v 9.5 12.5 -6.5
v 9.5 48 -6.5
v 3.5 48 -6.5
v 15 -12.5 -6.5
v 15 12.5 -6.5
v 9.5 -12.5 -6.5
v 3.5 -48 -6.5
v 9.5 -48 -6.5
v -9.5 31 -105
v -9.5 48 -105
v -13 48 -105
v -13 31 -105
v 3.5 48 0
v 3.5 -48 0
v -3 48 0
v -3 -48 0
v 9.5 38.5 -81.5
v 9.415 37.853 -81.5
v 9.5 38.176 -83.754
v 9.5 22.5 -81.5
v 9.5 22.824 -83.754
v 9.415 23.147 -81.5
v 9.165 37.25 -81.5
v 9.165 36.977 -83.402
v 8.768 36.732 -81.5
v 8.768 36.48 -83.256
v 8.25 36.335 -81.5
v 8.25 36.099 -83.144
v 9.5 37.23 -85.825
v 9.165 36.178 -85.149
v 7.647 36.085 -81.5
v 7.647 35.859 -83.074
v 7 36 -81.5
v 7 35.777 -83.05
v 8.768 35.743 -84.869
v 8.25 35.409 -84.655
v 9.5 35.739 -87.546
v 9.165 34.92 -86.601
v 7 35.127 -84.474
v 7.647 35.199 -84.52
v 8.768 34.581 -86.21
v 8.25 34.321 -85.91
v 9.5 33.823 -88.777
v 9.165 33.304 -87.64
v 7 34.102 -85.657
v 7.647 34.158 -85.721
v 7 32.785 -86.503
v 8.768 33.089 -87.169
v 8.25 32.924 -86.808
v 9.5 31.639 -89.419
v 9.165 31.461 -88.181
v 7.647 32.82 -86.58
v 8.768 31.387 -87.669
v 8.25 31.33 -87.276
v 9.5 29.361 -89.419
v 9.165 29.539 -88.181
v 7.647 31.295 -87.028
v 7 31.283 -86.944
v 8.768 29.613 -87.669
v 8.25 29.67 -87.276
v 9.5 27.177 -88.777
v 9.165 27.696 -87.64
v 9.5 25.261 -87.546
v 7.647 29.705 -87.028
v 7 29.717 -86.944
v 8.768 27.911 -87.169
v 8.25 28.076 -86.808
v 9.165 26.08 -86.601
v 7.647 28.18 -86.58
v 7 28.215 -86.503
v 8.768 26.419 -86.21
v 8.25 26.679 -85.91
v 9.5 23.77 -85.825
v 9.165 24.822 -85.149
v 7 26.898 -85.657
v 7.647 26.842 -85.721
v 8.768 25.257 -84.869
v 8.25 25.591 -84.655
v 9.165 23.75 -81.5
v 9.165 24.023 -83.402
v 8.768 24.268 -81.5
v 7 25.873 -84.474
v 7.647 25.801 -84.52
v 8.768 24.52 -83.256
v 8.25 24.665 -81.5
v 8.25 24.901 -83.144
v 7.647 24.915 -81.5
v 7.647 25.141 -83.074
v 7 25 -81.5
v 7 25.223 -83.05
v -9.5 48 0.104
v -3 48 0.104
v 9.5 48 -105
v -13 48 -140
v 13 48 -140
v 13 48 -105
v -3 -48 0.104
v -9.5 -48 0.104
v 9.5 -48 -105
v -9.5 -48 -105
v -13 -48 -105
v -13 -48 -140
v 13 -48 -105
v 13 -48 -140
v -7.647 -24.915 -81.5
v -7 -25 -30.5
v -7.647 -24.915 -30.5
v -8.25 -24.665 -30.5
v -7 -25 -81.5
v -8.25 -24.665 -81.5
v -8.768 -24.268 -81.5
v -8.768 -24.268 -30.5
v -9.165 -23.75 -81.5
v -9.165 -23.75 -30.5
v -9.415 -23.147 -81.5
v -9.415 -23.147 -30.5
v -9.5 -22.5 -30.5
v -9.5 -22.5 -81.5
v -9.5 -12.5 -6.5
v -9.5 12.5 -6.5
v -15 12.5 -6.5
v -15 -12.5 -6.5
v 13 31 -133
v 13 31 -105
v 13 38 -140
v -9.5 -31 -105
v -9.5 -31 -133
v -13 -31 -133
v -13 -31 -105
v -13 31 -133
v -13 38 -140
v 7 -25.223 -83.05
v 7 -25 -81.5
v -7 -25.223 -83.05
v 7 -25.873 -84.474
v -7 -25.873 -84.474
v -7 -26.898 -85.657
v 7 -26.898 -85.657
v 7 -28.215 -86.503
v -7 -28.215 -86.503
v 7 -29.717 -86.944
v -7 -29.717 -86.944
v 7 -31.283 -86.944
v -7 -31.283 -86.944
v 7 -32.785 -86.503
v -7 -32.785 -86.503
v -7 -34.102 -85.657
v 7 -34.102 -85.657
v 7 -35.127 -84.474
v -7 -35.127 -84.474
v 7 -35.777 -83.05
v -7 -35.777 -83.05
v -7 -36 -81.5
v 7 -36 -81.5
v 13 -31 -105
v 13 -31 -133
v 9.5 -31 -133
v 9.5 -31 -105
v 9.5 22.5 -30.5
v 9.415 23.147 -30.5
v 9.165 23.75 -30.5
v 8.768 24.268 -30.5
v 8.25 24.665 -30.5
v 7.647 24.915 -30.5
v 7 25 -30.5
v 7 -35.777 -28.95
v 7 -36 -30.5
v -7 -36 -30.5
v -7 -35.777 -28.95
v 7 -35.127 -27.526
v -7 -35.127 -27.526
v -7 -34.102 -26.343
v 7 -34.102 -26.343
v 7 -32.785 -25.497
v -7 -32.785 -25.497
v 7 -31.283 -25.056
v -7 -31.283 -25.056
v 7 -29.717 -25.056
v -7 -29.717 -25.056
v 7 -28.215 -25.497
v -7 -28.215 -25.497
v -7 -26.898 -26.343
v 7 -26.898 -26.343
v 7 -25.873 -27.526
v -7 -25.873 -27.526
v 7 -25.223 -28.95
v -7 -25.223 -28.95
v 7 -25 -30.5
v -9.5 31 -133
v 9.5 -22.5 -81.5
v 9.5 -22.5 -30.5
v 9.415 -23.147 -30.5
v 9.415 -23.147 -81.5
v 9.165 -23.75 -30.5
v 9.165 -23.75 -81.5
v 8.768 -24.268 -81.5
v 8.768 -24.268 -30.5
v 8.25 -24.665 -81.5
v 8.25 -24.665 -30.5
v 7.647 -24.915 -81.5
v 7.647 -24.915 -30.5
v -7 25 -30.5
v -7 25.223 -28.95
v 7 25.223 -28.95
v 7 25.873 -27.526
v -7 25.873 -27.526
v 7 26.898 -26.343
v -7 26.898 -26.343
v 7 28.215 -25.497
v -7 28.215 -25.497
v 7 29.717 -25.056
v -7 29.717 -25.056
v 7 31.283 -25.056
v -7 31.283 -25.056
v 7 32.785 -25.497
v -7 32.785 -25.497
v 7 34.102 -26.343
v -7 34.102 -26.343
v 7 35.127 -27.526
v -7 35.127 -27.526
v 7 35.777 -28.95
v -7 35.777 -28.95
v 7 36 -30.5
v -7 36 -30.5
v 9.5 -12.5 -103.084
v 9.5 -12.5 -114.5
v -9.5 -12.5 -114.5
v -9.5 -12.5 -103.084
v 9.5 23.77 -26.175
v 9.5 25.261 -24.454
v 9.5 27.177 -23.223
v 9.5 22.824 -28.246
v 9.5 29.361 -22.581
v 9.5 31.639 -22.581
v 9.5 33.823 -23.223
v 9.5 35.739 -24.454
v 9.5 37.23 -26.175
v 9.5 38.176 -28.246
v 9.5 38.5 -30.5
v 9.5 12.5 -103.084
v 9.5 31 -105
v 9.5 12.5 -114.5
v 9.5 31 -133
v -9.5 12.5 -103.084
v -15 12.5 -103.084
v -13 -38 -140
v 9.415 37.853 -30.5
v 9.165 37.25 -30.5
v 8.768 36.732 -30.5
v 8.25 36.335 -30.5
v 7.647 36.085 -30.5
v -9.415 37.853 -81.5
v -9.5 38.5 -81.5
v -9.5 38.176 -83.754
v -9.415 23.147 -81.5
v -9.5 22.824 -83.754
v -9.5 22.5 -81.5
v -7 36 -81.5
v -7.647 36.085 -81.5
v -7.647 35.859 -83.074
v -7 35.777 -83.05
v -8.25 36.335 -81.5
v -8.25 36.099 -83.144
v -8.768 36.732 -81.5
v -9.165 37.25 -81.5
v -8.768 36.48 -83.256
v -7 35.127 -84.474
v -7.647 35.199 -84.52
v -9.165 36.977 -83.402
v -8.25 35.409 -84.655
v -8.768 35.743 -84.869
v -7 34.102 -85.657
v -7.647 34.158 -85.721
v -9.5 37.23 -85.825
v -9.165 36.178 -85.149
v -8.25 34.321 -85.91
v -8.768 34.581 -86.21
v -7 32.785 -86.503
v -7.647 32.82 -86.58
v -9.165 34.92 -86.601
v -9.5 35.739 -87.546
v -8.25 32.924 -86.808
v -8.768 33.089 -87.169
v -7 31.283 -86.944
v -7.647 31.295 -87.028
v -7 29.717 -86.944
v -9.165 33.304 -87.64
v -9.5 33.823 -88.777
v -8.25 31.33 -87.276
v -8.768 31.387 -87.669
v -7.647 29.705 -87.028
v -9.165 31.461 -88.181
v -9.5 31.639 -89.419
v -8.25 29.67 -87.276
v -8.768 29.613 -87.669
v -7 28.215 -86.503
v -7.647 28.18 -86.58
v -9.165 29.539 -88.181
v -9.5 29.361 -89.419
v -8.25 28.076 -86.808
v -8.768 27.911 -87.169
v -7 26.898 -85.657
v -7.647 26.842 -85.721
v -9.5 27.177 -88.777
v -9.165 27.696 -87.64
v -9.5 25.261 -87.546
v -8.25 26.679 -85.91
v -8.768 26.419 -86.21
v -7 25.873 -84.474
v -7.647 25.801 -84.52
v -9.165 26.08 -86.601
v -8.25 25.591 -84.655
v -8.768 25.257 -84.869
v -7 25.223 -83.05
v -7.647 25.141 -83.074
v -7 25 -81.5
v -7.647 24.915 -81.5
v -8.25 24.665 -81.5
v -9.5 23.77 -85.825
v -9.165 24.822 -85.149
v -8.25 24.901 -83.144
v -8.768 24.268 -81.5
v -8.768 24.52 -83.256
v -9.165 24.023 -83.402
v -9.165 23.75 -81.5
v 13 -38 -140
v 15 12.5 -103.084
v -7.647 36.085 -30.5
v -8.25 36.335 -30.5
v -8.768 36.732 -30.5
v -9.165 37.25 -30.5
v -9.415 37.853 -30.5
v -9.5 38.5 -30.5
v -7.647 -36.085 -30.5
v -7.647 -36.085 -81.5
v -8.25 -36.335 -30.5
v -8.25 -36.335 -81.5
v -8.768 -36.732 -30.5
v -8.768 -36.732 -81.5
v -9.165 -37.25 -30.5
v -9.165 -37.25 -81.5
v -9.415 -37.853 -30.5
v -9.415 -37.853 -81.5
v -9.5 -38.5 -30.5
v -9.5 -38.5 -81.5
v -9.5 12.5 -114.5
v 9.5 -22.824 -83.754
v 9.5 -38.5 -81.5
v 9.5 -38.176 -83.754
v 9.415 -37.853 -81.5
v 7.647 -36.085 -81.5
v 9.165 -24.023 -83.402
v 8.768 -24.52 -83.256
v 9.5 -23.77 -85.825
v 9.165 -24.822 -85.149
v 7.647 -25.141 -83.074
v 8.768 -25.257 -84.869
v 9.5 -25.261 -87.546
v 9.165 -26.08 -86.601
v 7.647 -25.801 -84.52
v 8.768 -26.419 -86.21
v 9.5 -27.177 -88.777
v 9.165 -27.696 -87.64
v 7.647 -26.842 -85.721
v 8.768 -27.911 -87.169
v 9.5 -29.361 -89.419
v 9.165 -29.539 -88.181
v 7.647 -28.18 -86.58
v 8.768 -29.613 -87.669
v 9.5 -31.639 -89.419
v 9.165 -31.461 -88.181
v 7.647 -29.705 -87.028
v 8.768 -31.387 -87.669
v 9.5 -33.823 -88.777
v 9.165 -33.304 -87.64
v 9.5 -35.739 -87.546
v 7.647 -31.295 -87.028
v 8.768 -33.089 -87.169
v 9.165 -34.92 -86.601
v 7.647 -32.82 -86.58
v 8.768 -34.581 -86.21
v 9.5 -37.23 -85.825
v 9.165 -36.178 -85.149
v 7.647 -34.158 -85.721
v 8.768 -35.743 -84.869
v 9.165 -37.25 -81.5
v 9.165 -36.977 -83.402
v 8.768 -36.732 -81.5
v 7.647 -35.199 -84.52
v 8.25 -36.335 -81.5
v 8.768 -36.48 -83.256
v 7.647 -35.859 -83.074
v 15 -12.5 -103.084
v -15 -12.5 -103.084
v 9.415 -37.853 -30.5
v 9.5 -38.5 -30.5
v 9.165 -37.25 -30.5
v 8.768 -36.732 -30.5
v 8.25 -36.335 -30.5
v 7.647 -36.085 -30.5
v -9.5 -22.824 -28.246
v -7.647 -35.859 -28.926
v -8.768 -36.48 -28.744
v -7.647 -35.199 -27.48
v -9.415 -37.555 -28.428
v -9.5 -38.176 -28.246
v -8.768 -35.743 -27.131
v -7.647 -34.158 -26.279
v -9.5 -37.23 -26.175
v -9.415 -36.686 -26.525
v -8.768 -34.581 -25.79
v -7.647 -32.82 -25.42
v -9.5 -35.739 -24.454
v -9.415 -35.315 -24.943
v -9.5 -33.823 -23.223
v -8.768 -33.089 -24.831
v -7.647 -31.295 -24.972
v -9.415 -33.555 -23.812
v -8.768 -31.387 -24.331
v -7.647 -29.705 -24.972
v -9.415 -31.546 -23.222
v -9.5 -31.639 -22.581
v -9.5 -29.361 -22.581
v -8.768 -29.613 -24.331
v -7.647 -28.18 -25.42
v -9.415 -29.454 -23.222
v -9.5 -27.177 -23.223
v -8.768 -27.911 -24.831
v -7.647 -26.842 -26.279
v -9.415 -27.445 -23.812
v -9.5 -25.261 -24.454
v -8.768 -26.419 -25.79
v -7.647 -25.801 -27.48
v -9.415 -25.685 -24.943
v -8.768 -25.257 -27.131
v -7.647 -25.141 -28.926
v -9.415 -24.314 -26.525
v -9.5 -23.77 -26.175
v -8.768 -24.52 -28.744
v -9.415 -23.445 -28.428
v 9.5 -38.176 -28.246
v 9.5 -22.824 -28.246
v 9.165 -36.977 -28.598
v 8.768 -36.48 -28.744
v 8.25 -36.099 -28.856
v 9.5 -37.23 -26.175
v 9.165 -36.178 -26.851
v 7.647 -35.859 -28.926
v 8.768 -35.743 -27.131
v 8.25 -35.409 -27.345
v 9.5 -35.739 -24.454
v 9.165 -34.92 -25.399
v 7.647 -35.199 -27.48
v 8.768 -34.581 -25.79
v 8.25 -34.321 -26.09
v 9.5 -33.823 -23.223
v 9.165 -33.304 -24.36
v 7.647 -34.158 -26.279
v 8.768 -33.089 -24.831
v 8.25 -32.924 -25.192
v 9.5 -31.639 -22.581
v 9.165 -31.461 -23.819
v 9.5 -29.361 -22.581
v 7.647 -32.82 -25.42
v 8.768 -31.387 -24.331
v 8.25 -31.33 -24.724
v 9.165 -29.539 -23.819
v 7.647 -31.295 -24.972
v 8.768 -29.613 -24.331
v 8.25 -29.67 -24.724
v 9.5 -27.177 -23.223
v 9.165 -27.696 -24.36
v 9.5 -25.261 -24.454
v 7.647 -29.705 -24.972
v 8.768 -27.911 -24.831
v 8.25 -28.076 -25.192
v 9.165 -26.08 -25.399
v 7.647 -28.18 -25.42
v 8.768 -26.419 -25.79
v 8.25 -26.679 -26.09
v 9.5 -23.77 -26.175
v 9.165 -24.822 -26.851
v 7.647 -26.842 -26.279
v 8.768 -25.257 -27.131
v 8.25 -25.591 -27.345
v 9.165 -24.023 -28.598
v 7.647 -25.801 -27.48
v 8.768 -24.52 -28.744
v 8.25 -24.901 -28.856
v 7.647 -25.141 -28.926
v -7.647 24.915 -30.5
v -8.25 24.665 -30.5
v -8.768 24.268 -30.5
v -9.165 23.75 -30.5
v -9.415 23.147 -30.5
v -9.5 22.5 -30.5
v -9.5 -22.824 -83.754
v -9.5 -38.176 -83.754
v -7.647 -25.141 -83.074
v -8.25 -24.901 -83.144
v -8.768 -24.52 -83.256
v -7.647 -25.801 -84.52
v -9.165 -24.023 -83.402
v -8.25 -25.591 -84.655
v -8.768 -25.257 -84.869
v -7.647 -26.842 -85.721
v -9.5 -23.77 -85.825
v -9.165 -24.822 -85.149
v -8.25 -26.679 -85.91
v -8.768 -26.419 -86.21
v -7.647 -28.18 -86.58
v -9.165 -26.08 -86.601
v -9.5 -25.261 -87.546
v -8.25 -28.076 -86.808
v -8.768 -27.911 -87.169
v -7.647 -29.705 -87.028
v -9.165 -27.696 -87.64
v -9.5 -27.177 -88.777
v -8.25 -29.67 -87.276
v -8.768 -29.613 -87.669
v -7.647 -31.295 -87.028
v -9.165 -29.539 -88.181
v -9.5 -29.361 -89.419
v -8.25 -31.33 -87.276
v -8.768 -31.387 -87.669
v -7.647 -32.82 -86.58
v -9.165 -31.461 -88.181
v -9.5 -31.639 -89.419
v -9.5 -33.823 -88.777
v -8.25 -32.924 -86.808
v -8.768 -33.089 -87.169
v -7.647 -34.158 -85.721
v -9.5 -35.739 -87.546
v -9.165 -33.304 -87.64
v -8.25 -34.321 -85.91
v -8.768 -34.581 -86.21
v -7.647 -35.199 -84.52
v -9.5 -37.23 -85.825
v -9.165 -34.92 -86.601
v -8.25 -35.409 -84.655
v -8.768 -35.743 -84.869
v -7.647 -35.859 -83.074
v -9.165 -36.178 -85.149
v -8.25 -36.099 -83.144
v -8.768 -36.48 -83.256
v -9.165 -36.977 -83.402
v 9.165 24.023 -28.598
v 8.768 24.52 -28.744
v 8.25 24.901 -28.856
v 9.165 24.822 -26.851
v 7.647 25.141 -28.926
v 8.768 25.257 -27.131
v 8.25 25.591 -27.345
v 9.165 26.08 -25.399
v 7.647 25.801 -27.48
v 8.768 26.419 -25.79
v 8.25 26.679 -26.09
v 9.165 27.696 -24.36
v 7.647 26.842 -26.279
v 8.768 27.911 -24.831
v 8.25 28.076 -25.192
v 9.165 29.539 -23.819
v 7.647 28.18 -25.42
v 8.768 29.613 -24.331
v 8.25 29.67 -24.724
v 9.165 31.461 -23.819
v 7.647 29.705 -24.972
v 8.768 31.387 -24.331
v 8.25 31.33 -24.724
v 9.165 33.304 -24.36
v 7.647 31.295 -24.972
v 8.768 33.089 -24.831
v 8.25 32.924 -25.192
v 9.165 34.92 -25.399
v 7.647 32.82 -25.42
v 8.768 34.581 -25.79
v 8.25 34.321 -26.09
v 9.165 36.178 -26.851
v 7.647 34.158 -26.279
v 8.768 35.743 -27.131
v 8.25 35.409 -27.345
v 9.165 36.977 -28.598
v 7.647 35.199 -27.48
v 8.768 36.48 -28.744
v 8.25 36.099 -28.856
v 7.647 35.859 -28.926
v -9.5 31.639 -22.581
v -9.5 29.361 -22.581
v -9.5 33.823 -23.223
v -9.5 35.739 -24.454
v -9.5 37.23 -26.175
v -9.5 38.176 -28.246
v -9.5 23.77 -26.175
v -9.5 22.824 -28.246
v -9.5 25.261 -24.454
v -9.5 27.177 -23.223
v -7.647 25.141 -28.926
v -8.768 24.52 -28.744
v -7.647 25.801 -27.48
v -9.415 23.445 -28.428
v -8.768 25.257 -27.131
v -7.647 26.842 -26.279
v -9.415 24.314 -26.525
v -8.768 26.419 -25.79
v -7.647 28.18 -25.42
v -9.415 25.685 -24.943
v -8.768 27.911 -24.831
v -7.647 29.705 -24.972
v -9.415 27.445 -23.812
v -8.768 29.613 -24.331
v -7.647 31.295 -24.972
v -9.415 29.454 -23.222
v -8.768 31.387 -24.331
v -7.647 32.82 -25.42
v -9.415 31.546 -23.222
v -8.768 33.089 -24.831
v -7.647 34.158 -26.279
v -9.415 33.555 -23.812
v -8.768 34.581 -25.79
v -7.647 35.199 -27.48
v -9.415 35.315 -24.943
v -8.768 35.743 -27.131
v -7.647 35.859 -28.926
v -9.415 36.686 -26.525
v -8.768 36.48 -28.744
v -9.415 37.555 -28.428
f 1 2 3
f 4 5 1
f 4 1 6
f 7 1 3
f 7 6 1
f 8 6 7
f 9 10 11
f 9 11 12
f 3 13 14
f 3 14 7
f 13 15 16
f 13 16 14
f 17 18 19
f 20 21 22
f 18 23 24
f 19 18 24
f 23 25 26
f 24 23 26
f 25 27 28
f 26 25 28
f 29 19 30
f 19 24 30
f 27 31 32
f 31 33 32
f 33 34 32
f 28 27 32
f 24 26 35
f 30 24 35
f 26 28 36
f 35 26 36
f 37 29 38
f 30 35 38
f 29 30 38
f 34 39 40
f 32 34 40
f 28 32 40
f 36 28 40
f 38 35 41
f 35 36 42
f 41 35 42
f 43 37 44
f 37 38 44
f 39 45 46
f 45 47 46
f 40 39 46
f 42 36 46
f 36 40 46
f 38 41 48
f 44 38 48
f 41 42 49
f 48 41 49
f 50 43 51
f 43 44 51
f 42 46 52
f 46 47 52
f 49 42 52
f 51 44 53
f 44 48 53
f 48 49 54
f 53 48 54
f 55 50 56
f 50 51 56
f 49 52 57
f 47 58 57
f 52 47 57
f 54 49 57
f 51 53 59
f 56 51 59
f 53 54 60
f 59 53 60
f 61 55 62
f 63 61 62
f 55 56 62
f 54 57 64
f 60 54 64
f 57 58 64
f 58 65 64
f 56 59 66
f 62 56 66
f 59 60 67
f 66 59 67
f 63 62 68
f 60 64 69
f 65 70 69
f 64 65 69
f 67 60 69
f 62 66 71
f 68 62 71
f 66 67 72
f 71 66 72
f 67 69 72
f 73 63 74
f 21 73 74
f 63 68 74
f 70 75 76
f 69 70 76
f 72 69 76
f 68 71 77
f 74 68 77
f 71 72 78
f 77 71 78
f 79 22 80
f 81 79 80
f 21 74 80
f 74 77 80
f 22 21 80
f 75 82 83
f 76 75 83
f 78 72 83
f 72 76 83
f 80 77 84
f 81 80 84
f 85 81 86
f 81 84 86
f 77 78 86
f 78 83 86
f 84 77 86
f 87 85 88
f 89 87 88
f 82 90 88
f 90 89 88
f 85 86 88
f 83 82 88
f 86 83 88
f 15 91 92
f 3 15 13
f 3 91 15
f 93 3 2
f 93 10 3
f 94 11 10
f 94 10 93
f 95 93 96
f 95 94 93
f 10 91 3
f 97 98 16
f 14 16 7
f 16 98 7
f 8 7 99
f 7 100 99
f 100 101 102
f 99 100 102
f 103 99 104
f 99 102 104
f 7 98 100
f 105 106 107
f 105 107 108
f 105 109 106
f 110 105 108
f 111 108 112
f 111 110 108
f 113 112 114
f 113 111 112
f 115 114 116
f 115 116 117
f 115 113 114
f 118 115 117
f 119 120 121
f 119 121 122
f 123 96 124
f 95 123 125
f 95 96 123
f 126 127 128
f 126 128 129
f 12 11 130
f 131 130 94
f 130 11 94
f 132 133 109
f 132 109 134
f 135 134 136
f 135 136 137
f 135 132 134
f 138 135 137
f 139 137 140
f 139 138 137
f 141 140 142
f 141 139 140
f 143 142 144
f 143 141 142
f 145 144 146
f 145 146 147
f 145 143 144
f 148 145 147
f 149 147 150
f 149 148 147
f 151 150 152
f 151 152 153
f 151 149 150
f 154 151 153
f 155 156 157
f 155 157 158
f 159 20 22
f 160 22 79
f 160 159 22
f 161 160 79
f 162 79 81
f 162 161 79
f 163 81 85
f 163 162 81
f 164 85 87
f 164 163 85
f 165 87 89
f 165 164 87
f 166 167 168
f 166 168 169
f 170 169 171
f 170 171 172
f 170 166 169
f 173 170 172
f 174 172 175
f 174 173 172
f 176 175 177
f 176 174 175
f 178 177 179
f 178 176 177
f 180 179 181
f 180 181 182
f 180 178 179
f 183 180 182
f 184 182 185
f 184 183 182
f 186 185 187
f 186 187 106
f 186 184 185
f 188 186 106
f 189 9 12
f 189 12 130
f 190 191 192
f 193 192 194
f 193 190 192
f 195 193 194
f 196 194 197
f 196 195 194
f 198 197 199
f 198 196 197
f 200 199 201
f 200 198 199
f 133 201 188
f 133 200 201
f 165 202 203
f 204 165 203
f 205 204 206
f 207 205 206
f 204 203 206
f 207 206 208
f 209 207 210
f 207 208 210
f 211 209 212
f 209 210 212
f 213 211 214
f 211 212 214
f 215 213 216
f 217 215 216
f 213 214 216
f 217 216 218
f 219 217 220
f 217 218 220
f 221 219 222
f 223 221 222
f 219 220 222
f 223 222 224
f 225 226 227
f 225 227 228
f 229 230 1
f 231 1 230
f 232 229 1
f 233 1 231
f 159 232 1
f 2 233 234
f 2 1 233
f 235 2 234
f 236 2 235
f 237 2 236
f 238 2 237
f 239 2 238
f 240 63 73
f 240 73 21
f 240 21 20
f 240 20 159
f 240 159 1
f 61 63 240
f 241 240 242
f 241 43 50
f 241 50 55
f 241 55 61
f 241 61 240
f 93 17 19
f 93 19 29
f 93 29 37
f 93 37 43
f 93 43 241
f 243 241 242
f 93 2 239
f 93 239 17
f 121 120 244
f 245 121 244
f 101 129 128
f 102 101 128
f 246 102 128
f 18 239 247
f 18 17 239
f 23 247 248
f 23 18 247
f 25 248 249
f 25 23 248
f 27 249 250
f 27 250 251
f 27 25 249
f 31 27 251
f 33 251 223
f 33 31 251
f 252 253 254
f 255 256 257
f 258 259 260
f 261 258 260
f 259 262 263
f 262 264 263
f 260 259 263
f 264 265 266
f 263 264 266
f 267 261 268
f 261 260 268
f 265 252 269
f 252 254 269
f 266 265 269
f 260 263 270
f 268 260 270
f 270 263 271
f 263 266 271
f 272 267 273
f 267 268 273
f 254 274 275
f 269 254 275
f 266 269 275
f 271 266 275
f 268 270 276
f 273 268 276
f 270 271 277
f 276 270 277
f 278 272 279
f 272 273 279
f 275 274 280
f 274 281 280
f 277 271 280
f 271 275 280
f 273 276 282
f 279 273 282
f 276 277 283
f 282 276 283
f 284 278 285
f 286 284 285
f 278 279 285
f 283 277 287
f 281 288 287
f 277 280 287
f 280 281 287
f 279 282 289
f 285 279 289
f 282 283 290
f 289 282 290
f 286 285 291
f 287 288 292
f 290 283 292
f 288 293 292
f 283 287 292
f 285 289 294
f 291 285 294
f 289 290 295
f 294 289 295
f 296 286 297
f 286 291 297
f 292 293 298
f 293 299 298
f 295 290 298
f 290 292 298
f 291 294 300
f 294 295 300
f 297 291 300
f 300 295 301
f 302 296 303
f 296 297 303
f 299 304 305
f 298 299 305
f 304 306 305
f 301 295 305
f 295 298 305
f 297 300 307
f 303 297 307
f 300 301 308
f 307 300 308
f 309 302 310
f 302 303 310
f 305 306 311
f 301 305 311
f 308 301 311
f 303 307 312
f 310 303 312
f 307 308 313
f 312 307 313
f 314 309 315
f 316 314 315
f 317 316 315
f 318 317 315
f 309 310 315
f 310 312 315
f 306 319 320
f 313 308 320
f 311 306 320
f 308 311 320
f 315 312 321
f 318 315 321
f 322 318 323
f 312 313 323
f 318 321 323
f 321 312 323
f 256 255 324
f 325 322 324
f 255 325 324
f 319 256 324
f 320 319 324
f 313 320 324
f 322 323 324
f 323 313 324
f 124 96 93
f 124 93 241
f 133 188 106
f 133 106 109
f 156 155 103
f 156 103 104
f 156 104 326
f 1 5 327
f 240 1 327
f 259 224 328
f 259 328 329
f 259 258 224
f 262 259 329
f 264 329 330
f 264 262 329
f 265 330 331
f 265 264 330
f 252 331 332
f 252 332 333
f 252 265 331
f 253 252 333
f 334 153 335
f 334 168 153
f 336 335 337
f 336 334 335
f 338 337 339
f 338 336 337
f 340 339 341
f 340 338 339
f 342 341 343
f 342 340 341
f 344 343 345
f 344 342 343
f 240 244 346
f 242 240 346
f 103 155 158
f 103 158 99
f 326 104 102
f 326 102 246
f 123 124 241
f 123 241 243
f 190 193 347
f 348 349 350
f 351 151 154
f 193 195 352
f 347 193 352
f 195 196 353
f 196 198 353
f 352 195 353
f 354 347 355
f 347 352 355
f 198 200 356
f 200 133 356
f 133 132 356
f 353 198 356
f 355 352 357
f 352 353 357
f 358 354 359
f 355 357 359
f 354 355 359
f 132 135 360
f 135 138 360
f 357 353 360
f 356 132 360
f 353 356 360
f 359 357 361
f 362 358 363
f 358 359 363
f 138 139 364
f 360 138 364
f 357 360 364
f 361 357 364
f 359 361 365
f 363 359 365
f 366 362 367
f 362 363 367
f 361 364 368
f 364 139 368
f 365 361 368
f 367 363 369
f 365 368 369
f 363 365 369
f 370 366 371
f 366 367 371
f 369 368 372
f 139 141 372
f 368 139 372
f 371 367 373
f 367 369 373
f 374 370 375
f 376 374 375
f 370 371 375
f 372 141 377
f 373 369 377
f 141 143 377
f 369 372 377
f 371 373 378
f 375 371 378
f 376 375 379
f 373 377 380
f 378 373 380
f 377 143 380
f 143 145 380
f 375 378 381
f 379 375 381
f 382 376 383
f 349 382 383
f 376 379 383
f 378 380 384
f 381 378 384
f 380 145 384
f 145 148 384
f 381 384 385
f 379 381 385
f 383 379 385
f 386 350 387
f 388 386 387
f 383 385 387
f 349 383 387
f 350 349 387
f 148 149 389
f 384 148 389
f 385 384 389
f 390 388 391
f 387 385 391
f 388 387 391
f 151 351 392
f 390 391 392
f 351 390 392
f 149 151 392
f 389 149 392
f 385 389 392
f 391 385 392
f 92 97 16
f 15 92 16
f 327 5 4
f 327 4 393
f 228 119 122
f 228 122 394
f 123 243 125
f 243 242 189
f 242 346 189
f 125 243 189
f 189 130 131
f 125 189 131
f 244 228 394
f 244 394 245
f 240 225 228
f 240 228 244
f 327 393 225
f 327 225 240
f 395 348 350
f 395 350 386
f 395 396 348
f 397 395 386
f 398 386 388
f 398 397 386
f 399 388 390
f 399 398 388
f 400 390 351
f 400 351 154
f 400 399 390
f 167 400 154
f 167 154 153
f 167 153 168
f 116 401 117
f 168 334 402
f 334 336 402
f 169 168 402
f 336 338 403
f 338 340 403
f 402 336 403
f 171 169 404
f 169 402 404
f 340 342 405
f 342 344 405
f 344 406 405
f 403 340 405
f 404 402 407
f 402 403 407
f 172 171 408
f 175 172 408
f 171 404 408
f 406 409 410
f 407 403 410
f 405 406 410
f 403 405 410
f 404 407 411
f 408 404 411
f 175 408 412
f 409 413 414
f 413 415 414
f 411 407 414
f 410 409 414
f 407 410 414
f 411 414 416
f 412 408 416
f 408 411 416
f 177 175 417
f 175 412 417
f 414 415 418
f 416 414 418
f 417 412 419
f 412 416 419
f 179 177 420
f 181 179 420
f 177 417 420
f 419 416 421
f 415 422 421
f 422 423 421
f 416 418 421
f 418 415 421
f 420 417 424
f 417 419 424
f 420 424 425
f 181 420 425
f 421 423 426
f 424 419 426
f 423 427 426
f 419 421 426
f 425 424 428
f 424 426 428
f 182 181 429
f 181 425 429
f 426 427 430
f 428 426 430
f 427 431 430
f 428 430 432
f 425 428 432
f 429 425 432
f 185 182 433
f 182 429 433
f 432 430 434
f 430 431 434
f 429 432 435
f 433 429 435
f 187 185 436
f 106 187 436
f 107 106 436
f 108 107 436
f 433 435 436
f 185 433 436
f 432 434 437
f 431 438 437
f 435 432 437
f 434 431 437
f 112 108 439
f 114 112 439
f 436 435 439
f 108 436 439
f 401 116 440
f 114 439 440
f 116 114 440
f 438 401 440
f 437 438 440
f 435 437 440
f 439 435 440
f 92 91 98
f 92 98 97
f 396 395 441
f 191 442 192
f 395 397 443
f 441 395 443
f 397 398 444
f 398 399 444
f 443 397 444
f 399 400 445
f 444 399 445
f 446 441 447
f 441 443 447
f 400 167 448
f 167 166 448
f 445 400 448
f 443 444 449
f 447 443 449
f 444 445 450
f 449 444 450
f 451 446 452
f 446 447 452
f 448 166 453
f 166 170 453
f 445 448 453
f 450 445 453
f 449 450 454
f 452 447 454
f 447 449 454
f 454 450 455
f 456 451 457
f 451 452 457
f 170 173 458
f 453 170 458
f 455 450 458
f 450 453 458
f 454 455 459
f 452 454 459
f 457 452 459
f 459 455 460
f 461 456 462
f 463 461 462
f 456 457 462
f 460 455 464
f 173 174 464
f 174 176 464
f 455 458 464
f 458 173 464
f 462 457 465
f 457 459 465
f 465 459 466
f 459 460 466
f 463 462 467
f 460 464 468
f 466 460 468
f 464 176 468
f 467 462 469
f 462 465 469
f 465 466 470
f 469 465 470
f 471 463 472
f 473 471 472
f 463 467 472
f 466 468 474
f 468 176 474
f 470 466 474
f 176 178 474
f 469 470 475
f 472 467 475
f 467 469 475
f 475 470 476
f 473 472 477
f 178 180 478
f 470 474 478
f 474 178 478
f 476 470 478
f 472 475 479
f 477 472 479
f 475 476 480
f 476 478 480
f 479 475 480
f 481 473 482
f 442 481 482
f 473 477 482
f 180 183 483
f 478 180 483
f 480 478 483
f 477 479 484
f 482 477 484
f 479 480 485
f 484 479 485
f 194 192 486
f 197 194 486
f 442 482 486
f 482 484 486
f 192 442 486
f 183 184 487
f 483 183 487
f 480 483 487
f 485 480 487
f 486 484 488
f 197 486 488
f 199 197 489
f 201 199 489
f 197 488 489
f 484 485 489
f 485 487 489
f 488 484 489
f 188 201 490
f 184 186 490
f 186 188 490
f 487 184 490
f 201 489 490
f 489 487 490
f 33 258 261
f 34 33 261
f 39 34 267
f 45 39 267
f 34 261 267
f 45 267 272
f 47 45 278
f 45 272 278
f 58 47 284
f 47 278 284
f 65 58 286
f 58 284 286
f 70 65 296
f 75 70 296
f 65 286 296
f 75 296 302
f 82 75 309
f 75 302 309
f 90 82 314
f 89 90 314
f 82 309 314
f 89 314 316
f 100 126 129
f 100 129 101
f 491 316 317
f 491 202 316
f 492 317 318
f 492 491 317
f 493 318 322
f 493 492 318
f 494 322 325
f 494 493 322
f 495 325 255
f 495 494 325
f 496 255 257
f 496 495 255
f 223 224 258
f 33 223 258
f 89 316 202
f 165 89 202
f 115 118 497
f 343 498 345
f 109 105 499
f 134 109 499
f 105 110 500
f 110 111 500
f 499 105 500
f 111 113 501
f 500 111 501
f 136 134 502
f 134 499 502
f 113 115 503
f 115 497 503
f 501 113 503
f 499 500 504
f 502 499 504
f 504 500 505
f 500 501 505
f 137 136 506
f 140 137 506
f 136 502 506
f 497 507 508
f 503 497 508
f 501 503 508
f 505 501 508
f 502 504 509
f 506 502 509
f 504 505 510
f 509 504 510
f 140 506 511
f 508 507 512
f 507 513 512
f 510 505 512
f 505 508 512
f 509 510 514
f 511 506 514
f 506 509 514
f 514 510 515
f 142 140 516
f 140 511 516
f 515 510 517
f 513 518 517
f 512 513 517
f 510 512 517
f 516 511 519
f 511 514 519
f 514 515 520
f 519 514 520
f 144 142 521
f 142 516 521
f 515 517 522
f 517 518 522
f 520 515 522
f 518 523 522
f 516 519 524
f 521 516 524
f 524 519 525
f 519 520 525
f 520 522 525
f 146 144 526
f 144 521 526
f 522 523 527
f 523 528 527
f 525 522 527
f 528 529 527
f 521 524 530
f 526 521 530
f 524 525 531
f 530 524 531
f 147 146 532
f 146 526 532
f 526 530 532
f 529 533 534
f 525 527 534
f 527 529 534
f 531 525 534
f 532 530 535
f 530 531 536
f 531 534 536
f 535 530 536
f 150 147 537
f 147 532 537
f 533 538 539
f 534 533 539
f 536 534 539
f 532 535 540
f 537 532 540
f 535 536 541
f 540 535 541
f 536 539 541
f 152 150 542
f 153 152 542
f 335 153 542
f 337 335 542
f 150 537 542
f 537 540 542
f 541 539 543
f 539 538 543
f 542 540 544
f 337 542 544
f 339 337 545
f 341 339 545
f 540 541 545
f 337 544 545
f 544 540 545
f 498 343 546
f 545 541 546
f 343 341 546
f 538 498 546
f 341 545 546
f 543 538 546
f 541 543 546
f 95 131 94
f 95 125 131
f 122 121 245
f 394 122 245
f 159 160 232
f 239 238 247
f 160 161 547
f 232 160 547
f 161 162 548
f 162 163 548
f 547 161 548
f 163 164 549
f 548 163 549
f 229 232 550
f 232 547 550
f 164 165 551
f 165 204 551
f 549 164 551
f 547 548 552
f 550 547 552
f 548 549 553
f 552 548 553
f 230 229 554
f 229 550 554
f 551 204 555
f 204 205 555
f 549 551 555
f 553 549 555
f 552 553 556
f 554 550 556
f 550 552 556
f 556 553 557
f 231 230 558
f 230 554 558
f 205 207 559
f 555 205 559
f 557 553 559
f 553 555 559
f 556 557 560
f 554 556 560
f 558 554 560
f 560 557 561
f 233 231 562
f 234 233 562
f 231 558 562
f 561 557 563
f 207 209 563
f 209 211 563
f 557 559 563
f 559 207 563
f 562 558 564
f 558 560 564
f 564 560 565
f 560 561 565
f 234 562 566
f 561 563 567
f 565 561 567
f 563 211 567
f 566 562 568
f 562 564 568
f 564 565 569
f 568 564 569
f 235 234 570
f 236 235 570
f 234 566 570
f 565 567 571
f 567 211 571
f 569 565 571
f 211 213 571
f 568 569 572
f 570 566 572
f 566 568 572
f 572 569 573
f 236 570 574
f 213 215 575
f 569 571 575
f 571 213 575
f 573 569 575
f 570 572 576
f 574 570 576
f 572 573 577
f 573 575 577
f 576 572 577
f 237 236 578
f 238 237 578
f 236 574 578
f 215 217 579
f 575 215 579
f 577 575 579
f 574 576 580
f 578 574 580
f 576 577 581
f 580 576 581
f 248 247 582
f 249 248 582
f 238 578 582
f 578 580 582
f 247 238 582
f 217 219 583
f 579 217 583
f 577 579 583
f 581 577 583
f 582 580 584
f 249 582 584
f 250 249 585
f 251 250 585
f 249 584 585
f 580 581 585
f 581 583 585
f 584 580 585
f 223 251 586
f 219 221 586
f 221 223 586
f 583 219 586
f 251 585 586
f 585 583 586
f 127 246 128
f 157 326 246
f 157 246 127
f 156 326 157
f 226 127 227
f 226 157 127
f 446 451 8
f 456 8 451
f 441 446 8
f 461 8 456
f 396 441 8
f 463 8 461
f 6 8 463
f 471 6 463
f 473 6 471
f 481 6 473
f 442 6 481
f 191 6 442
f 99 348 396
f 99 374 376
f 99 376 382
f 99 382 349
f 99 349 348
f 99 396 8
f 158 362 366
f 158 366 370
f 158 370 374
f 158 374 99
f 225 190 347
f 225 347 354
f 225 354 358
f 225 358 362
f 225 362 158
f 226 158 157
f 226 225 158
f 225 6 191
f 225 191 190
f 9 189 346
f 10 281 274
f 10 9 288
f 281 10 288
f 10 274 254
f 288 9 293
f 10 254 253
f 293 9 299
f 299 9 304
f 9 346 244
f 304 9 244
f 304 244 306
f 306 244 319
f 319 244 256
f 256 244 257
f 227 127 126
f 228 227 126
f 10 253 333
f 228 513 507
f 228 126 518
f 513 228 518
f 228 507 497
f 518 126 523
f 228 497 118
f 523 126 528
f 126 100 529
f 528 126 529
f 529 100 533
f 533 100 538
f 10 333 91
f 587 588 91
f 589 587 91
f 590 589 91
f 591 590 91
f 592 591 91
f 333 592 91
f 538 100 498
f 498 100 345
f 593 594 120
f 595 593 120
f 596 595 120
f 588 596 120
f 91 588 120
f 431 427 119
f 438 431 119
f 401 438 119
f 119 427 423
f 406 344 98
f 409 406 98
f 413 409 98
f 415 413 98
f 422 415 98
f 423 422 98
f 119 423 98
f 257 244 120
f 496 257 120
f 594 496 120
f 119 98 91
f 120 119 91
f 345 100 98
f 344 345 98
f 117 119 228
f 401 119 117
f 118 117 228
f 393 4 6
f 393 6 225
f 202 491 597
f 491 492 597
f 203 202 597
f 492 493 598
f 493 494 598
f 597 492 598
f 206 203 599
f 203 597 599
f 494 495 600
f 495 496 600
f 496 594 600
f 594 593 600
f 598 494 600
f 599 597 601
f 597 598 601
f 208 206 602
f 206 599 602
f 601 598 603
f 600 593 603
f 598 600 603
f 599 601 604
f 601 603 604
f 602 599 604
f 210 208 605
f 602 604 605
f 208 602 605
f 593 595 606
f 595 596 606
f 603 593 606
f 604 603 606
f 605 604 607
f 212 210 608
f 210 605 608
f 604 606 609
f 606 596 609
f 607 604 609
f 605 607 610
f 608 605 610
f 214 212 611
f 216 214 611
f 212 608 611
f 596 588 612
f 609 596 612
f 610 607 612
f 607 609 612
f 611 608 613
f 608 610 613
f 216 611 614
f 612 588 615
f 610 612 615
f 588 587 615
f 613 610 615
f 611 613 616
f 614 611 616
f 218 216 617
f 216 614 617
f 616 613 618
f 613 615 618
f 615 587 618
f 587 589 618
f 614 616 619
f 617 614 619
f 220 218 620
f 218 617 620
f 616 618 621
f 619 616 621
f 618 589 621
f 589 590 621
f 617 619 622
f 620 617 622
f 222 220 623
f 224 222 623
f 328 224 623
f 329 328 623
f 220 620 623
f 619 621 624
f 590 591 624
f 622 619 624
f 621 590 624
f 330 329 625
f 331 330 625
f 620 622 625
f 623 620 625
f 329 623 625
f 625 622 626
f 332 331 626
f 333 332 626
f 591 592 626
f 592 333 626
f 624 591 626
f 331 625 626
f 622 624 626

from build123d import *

# Parameters (mm, degrees)
BOSS_EXTRUDE8_DEPTH   = 13
BOSS_EXTRUDE8_2_DEPTH = 13
SKETCH1_14_W          = 96.584344236
SKETCH1_14_H          = 25
BOSS_EXTRUDE9_DEPTH   = 15
BOSS_EXTRUDE10_DEPTH  = 9.5
EXTRUDE_THIN3_START   = -96
EXTRUDE_THIN3_DEPTH   = 96
FILLET1_R             = 2.5


# Read off the part's stored shape, not the designer's step: Extrude-Thin3
with BuildPart() as part:
    # Sketch1 → Boss-Extrude8 (new, symmetric)
    with BuildSketch(Plane(origin=(0, 0, 0), x_dir=(0, 0, -1), z_dir=(1, 0, 0))):
        Polygon((140, 48), (105, 48), (105, 31), (133, 31), (140, 38), align=None)
    extrude(amount=BOSS_EXTRUDE8_DEPTH, both=True)



with BuildPart() as body_2:
    # Sketch1 → Boss-Extrude8 2 (new, symmetric)
    with BuildSketch(Plane(origin=(0, 0, 0), x_dir=(0, 0, -1), z_dir=(1, 0, 0))):
        Polygon((105, -31), (105, -48), (140, -48), (140, -38), (133, -31), align=None)
    extrude(amount=BOSS_EXTRUDE8_2_DEPTH, both=True)


with BuildPart() as body_3:
    # Sketch1<14> → Boss-Extrude9 (new, symmetric)
    with BuildSketch(Plane(origin=(0, 0, 0), x_dir=(0, 0, -1), z_dir=(1, 0, 0))):
        with Locations((54.792172118, 0)):
            Rectangle(SKETCH1_14_W, SKETCH1_14_H)
    extrude(amount=BOSS_EXTRUDE9_DEPTH, both=True)


with BuildPart() as part_1:
    add(part.part)

    add(body_2.part)  # Boss-Extrude10 merges body 2

    add(body_3.part)  # Boss-Extrude10 merges body 3
    # Sketch1<15> → Boss-Extrude10 (add, symmetric)
    # profile 1 of 2: a face of its own
    with BuildSketch(Plane(origin=(0, 0, 0), x_dir=(0, 0, -1), z_dir=(1, 0, 0))):
        Polygon((6.5, 48), (6.5, 12.5), (103.084344236, 12.5), (114.5, 12.5), (133, 31), (105, 31), (105, 48), align=None)
        with BuildLine():
            ThreePointArc((30.5, 25), (25, 30.5), (30.5, 36))
            Line((30.5, 36), (81.5, 36))
            ThreePointArc((81.5, 36), (87, 30.5), (81.5, 25))
            Line((81.5, 25), (30.5, 25))
        make_face(mode=Mode.SUBTRACT)
    # profile 2 of 2: a face of its own
    with BuildSketch(Plane(origin=(0, 0, 0), x_dir=(0, 0, -1), z_dir=(1, 0, 0))):
        Polygon((6.5, -12.5), (6.5, -48), (105, -48), (105, -31), (133, -31), (114.5, -12.5), (103.084344236, -12.5), align=None)
        with BuildLine():
            Line((81.5, -36), (30.5, -36))
            ThreePointArc((30.5, -36), (25, -30.5), (30.5, -25))
            Line((30.5, -25), (81.5, -25))
            ThreePointArc((81.5, -25), (87, -30.5), (81.5, -36))
        make_face(mode=Mode.SUBTRACT)
    extrude(amount=BOSS_EXTRUDE10_DEPTH, both=True)

    # Extrude-Thin3 outline → Extrude-Thin3 (add)
    with BuildSketch(Plane(origin=(0, 48, 0), x_dir=(1, 0, 0), z_dir=(0, 1, 0)).offset(EXTRUDE_THIN3_START)):
        Polygon((-9.5, -0.104199667), (-3, -0.104199667), (-3, 0), (3.5, 0), (3.5, 6.5), (-9.5, 6.5), align=None)
    extrude(amount=EXTRUDE_THIN3_DEPTH)

    # Fillet1
    fillet1_edges = [part_1.edges().sort_by_distance(p)[0] for p in [
        (9.5, 30.5, -87),
        (9.5, 25, -56),
        (9.5, 30.5, -25),
        (-9.5, 36, -56),
        (9.5, 36, -56),
        (-9.5, 30.5, -87),
        (-9.5, 30.5, -25),
        (-9.5, 25, -56),
        (-9.5, -25, -56),
        (-9.5, -30.5, -87),
        (9.5, -36, -56),
        (-9.5, -30.5, -25),
        (9.5, -25, -56),
        (9.5, -30.5, -87),
        (9.5, -30.5, -25),
        (-9.5, -36, -56),
    ]]
    fillet(fillet1_edges, radius=FILLET1_R)


solid = part_1.part
